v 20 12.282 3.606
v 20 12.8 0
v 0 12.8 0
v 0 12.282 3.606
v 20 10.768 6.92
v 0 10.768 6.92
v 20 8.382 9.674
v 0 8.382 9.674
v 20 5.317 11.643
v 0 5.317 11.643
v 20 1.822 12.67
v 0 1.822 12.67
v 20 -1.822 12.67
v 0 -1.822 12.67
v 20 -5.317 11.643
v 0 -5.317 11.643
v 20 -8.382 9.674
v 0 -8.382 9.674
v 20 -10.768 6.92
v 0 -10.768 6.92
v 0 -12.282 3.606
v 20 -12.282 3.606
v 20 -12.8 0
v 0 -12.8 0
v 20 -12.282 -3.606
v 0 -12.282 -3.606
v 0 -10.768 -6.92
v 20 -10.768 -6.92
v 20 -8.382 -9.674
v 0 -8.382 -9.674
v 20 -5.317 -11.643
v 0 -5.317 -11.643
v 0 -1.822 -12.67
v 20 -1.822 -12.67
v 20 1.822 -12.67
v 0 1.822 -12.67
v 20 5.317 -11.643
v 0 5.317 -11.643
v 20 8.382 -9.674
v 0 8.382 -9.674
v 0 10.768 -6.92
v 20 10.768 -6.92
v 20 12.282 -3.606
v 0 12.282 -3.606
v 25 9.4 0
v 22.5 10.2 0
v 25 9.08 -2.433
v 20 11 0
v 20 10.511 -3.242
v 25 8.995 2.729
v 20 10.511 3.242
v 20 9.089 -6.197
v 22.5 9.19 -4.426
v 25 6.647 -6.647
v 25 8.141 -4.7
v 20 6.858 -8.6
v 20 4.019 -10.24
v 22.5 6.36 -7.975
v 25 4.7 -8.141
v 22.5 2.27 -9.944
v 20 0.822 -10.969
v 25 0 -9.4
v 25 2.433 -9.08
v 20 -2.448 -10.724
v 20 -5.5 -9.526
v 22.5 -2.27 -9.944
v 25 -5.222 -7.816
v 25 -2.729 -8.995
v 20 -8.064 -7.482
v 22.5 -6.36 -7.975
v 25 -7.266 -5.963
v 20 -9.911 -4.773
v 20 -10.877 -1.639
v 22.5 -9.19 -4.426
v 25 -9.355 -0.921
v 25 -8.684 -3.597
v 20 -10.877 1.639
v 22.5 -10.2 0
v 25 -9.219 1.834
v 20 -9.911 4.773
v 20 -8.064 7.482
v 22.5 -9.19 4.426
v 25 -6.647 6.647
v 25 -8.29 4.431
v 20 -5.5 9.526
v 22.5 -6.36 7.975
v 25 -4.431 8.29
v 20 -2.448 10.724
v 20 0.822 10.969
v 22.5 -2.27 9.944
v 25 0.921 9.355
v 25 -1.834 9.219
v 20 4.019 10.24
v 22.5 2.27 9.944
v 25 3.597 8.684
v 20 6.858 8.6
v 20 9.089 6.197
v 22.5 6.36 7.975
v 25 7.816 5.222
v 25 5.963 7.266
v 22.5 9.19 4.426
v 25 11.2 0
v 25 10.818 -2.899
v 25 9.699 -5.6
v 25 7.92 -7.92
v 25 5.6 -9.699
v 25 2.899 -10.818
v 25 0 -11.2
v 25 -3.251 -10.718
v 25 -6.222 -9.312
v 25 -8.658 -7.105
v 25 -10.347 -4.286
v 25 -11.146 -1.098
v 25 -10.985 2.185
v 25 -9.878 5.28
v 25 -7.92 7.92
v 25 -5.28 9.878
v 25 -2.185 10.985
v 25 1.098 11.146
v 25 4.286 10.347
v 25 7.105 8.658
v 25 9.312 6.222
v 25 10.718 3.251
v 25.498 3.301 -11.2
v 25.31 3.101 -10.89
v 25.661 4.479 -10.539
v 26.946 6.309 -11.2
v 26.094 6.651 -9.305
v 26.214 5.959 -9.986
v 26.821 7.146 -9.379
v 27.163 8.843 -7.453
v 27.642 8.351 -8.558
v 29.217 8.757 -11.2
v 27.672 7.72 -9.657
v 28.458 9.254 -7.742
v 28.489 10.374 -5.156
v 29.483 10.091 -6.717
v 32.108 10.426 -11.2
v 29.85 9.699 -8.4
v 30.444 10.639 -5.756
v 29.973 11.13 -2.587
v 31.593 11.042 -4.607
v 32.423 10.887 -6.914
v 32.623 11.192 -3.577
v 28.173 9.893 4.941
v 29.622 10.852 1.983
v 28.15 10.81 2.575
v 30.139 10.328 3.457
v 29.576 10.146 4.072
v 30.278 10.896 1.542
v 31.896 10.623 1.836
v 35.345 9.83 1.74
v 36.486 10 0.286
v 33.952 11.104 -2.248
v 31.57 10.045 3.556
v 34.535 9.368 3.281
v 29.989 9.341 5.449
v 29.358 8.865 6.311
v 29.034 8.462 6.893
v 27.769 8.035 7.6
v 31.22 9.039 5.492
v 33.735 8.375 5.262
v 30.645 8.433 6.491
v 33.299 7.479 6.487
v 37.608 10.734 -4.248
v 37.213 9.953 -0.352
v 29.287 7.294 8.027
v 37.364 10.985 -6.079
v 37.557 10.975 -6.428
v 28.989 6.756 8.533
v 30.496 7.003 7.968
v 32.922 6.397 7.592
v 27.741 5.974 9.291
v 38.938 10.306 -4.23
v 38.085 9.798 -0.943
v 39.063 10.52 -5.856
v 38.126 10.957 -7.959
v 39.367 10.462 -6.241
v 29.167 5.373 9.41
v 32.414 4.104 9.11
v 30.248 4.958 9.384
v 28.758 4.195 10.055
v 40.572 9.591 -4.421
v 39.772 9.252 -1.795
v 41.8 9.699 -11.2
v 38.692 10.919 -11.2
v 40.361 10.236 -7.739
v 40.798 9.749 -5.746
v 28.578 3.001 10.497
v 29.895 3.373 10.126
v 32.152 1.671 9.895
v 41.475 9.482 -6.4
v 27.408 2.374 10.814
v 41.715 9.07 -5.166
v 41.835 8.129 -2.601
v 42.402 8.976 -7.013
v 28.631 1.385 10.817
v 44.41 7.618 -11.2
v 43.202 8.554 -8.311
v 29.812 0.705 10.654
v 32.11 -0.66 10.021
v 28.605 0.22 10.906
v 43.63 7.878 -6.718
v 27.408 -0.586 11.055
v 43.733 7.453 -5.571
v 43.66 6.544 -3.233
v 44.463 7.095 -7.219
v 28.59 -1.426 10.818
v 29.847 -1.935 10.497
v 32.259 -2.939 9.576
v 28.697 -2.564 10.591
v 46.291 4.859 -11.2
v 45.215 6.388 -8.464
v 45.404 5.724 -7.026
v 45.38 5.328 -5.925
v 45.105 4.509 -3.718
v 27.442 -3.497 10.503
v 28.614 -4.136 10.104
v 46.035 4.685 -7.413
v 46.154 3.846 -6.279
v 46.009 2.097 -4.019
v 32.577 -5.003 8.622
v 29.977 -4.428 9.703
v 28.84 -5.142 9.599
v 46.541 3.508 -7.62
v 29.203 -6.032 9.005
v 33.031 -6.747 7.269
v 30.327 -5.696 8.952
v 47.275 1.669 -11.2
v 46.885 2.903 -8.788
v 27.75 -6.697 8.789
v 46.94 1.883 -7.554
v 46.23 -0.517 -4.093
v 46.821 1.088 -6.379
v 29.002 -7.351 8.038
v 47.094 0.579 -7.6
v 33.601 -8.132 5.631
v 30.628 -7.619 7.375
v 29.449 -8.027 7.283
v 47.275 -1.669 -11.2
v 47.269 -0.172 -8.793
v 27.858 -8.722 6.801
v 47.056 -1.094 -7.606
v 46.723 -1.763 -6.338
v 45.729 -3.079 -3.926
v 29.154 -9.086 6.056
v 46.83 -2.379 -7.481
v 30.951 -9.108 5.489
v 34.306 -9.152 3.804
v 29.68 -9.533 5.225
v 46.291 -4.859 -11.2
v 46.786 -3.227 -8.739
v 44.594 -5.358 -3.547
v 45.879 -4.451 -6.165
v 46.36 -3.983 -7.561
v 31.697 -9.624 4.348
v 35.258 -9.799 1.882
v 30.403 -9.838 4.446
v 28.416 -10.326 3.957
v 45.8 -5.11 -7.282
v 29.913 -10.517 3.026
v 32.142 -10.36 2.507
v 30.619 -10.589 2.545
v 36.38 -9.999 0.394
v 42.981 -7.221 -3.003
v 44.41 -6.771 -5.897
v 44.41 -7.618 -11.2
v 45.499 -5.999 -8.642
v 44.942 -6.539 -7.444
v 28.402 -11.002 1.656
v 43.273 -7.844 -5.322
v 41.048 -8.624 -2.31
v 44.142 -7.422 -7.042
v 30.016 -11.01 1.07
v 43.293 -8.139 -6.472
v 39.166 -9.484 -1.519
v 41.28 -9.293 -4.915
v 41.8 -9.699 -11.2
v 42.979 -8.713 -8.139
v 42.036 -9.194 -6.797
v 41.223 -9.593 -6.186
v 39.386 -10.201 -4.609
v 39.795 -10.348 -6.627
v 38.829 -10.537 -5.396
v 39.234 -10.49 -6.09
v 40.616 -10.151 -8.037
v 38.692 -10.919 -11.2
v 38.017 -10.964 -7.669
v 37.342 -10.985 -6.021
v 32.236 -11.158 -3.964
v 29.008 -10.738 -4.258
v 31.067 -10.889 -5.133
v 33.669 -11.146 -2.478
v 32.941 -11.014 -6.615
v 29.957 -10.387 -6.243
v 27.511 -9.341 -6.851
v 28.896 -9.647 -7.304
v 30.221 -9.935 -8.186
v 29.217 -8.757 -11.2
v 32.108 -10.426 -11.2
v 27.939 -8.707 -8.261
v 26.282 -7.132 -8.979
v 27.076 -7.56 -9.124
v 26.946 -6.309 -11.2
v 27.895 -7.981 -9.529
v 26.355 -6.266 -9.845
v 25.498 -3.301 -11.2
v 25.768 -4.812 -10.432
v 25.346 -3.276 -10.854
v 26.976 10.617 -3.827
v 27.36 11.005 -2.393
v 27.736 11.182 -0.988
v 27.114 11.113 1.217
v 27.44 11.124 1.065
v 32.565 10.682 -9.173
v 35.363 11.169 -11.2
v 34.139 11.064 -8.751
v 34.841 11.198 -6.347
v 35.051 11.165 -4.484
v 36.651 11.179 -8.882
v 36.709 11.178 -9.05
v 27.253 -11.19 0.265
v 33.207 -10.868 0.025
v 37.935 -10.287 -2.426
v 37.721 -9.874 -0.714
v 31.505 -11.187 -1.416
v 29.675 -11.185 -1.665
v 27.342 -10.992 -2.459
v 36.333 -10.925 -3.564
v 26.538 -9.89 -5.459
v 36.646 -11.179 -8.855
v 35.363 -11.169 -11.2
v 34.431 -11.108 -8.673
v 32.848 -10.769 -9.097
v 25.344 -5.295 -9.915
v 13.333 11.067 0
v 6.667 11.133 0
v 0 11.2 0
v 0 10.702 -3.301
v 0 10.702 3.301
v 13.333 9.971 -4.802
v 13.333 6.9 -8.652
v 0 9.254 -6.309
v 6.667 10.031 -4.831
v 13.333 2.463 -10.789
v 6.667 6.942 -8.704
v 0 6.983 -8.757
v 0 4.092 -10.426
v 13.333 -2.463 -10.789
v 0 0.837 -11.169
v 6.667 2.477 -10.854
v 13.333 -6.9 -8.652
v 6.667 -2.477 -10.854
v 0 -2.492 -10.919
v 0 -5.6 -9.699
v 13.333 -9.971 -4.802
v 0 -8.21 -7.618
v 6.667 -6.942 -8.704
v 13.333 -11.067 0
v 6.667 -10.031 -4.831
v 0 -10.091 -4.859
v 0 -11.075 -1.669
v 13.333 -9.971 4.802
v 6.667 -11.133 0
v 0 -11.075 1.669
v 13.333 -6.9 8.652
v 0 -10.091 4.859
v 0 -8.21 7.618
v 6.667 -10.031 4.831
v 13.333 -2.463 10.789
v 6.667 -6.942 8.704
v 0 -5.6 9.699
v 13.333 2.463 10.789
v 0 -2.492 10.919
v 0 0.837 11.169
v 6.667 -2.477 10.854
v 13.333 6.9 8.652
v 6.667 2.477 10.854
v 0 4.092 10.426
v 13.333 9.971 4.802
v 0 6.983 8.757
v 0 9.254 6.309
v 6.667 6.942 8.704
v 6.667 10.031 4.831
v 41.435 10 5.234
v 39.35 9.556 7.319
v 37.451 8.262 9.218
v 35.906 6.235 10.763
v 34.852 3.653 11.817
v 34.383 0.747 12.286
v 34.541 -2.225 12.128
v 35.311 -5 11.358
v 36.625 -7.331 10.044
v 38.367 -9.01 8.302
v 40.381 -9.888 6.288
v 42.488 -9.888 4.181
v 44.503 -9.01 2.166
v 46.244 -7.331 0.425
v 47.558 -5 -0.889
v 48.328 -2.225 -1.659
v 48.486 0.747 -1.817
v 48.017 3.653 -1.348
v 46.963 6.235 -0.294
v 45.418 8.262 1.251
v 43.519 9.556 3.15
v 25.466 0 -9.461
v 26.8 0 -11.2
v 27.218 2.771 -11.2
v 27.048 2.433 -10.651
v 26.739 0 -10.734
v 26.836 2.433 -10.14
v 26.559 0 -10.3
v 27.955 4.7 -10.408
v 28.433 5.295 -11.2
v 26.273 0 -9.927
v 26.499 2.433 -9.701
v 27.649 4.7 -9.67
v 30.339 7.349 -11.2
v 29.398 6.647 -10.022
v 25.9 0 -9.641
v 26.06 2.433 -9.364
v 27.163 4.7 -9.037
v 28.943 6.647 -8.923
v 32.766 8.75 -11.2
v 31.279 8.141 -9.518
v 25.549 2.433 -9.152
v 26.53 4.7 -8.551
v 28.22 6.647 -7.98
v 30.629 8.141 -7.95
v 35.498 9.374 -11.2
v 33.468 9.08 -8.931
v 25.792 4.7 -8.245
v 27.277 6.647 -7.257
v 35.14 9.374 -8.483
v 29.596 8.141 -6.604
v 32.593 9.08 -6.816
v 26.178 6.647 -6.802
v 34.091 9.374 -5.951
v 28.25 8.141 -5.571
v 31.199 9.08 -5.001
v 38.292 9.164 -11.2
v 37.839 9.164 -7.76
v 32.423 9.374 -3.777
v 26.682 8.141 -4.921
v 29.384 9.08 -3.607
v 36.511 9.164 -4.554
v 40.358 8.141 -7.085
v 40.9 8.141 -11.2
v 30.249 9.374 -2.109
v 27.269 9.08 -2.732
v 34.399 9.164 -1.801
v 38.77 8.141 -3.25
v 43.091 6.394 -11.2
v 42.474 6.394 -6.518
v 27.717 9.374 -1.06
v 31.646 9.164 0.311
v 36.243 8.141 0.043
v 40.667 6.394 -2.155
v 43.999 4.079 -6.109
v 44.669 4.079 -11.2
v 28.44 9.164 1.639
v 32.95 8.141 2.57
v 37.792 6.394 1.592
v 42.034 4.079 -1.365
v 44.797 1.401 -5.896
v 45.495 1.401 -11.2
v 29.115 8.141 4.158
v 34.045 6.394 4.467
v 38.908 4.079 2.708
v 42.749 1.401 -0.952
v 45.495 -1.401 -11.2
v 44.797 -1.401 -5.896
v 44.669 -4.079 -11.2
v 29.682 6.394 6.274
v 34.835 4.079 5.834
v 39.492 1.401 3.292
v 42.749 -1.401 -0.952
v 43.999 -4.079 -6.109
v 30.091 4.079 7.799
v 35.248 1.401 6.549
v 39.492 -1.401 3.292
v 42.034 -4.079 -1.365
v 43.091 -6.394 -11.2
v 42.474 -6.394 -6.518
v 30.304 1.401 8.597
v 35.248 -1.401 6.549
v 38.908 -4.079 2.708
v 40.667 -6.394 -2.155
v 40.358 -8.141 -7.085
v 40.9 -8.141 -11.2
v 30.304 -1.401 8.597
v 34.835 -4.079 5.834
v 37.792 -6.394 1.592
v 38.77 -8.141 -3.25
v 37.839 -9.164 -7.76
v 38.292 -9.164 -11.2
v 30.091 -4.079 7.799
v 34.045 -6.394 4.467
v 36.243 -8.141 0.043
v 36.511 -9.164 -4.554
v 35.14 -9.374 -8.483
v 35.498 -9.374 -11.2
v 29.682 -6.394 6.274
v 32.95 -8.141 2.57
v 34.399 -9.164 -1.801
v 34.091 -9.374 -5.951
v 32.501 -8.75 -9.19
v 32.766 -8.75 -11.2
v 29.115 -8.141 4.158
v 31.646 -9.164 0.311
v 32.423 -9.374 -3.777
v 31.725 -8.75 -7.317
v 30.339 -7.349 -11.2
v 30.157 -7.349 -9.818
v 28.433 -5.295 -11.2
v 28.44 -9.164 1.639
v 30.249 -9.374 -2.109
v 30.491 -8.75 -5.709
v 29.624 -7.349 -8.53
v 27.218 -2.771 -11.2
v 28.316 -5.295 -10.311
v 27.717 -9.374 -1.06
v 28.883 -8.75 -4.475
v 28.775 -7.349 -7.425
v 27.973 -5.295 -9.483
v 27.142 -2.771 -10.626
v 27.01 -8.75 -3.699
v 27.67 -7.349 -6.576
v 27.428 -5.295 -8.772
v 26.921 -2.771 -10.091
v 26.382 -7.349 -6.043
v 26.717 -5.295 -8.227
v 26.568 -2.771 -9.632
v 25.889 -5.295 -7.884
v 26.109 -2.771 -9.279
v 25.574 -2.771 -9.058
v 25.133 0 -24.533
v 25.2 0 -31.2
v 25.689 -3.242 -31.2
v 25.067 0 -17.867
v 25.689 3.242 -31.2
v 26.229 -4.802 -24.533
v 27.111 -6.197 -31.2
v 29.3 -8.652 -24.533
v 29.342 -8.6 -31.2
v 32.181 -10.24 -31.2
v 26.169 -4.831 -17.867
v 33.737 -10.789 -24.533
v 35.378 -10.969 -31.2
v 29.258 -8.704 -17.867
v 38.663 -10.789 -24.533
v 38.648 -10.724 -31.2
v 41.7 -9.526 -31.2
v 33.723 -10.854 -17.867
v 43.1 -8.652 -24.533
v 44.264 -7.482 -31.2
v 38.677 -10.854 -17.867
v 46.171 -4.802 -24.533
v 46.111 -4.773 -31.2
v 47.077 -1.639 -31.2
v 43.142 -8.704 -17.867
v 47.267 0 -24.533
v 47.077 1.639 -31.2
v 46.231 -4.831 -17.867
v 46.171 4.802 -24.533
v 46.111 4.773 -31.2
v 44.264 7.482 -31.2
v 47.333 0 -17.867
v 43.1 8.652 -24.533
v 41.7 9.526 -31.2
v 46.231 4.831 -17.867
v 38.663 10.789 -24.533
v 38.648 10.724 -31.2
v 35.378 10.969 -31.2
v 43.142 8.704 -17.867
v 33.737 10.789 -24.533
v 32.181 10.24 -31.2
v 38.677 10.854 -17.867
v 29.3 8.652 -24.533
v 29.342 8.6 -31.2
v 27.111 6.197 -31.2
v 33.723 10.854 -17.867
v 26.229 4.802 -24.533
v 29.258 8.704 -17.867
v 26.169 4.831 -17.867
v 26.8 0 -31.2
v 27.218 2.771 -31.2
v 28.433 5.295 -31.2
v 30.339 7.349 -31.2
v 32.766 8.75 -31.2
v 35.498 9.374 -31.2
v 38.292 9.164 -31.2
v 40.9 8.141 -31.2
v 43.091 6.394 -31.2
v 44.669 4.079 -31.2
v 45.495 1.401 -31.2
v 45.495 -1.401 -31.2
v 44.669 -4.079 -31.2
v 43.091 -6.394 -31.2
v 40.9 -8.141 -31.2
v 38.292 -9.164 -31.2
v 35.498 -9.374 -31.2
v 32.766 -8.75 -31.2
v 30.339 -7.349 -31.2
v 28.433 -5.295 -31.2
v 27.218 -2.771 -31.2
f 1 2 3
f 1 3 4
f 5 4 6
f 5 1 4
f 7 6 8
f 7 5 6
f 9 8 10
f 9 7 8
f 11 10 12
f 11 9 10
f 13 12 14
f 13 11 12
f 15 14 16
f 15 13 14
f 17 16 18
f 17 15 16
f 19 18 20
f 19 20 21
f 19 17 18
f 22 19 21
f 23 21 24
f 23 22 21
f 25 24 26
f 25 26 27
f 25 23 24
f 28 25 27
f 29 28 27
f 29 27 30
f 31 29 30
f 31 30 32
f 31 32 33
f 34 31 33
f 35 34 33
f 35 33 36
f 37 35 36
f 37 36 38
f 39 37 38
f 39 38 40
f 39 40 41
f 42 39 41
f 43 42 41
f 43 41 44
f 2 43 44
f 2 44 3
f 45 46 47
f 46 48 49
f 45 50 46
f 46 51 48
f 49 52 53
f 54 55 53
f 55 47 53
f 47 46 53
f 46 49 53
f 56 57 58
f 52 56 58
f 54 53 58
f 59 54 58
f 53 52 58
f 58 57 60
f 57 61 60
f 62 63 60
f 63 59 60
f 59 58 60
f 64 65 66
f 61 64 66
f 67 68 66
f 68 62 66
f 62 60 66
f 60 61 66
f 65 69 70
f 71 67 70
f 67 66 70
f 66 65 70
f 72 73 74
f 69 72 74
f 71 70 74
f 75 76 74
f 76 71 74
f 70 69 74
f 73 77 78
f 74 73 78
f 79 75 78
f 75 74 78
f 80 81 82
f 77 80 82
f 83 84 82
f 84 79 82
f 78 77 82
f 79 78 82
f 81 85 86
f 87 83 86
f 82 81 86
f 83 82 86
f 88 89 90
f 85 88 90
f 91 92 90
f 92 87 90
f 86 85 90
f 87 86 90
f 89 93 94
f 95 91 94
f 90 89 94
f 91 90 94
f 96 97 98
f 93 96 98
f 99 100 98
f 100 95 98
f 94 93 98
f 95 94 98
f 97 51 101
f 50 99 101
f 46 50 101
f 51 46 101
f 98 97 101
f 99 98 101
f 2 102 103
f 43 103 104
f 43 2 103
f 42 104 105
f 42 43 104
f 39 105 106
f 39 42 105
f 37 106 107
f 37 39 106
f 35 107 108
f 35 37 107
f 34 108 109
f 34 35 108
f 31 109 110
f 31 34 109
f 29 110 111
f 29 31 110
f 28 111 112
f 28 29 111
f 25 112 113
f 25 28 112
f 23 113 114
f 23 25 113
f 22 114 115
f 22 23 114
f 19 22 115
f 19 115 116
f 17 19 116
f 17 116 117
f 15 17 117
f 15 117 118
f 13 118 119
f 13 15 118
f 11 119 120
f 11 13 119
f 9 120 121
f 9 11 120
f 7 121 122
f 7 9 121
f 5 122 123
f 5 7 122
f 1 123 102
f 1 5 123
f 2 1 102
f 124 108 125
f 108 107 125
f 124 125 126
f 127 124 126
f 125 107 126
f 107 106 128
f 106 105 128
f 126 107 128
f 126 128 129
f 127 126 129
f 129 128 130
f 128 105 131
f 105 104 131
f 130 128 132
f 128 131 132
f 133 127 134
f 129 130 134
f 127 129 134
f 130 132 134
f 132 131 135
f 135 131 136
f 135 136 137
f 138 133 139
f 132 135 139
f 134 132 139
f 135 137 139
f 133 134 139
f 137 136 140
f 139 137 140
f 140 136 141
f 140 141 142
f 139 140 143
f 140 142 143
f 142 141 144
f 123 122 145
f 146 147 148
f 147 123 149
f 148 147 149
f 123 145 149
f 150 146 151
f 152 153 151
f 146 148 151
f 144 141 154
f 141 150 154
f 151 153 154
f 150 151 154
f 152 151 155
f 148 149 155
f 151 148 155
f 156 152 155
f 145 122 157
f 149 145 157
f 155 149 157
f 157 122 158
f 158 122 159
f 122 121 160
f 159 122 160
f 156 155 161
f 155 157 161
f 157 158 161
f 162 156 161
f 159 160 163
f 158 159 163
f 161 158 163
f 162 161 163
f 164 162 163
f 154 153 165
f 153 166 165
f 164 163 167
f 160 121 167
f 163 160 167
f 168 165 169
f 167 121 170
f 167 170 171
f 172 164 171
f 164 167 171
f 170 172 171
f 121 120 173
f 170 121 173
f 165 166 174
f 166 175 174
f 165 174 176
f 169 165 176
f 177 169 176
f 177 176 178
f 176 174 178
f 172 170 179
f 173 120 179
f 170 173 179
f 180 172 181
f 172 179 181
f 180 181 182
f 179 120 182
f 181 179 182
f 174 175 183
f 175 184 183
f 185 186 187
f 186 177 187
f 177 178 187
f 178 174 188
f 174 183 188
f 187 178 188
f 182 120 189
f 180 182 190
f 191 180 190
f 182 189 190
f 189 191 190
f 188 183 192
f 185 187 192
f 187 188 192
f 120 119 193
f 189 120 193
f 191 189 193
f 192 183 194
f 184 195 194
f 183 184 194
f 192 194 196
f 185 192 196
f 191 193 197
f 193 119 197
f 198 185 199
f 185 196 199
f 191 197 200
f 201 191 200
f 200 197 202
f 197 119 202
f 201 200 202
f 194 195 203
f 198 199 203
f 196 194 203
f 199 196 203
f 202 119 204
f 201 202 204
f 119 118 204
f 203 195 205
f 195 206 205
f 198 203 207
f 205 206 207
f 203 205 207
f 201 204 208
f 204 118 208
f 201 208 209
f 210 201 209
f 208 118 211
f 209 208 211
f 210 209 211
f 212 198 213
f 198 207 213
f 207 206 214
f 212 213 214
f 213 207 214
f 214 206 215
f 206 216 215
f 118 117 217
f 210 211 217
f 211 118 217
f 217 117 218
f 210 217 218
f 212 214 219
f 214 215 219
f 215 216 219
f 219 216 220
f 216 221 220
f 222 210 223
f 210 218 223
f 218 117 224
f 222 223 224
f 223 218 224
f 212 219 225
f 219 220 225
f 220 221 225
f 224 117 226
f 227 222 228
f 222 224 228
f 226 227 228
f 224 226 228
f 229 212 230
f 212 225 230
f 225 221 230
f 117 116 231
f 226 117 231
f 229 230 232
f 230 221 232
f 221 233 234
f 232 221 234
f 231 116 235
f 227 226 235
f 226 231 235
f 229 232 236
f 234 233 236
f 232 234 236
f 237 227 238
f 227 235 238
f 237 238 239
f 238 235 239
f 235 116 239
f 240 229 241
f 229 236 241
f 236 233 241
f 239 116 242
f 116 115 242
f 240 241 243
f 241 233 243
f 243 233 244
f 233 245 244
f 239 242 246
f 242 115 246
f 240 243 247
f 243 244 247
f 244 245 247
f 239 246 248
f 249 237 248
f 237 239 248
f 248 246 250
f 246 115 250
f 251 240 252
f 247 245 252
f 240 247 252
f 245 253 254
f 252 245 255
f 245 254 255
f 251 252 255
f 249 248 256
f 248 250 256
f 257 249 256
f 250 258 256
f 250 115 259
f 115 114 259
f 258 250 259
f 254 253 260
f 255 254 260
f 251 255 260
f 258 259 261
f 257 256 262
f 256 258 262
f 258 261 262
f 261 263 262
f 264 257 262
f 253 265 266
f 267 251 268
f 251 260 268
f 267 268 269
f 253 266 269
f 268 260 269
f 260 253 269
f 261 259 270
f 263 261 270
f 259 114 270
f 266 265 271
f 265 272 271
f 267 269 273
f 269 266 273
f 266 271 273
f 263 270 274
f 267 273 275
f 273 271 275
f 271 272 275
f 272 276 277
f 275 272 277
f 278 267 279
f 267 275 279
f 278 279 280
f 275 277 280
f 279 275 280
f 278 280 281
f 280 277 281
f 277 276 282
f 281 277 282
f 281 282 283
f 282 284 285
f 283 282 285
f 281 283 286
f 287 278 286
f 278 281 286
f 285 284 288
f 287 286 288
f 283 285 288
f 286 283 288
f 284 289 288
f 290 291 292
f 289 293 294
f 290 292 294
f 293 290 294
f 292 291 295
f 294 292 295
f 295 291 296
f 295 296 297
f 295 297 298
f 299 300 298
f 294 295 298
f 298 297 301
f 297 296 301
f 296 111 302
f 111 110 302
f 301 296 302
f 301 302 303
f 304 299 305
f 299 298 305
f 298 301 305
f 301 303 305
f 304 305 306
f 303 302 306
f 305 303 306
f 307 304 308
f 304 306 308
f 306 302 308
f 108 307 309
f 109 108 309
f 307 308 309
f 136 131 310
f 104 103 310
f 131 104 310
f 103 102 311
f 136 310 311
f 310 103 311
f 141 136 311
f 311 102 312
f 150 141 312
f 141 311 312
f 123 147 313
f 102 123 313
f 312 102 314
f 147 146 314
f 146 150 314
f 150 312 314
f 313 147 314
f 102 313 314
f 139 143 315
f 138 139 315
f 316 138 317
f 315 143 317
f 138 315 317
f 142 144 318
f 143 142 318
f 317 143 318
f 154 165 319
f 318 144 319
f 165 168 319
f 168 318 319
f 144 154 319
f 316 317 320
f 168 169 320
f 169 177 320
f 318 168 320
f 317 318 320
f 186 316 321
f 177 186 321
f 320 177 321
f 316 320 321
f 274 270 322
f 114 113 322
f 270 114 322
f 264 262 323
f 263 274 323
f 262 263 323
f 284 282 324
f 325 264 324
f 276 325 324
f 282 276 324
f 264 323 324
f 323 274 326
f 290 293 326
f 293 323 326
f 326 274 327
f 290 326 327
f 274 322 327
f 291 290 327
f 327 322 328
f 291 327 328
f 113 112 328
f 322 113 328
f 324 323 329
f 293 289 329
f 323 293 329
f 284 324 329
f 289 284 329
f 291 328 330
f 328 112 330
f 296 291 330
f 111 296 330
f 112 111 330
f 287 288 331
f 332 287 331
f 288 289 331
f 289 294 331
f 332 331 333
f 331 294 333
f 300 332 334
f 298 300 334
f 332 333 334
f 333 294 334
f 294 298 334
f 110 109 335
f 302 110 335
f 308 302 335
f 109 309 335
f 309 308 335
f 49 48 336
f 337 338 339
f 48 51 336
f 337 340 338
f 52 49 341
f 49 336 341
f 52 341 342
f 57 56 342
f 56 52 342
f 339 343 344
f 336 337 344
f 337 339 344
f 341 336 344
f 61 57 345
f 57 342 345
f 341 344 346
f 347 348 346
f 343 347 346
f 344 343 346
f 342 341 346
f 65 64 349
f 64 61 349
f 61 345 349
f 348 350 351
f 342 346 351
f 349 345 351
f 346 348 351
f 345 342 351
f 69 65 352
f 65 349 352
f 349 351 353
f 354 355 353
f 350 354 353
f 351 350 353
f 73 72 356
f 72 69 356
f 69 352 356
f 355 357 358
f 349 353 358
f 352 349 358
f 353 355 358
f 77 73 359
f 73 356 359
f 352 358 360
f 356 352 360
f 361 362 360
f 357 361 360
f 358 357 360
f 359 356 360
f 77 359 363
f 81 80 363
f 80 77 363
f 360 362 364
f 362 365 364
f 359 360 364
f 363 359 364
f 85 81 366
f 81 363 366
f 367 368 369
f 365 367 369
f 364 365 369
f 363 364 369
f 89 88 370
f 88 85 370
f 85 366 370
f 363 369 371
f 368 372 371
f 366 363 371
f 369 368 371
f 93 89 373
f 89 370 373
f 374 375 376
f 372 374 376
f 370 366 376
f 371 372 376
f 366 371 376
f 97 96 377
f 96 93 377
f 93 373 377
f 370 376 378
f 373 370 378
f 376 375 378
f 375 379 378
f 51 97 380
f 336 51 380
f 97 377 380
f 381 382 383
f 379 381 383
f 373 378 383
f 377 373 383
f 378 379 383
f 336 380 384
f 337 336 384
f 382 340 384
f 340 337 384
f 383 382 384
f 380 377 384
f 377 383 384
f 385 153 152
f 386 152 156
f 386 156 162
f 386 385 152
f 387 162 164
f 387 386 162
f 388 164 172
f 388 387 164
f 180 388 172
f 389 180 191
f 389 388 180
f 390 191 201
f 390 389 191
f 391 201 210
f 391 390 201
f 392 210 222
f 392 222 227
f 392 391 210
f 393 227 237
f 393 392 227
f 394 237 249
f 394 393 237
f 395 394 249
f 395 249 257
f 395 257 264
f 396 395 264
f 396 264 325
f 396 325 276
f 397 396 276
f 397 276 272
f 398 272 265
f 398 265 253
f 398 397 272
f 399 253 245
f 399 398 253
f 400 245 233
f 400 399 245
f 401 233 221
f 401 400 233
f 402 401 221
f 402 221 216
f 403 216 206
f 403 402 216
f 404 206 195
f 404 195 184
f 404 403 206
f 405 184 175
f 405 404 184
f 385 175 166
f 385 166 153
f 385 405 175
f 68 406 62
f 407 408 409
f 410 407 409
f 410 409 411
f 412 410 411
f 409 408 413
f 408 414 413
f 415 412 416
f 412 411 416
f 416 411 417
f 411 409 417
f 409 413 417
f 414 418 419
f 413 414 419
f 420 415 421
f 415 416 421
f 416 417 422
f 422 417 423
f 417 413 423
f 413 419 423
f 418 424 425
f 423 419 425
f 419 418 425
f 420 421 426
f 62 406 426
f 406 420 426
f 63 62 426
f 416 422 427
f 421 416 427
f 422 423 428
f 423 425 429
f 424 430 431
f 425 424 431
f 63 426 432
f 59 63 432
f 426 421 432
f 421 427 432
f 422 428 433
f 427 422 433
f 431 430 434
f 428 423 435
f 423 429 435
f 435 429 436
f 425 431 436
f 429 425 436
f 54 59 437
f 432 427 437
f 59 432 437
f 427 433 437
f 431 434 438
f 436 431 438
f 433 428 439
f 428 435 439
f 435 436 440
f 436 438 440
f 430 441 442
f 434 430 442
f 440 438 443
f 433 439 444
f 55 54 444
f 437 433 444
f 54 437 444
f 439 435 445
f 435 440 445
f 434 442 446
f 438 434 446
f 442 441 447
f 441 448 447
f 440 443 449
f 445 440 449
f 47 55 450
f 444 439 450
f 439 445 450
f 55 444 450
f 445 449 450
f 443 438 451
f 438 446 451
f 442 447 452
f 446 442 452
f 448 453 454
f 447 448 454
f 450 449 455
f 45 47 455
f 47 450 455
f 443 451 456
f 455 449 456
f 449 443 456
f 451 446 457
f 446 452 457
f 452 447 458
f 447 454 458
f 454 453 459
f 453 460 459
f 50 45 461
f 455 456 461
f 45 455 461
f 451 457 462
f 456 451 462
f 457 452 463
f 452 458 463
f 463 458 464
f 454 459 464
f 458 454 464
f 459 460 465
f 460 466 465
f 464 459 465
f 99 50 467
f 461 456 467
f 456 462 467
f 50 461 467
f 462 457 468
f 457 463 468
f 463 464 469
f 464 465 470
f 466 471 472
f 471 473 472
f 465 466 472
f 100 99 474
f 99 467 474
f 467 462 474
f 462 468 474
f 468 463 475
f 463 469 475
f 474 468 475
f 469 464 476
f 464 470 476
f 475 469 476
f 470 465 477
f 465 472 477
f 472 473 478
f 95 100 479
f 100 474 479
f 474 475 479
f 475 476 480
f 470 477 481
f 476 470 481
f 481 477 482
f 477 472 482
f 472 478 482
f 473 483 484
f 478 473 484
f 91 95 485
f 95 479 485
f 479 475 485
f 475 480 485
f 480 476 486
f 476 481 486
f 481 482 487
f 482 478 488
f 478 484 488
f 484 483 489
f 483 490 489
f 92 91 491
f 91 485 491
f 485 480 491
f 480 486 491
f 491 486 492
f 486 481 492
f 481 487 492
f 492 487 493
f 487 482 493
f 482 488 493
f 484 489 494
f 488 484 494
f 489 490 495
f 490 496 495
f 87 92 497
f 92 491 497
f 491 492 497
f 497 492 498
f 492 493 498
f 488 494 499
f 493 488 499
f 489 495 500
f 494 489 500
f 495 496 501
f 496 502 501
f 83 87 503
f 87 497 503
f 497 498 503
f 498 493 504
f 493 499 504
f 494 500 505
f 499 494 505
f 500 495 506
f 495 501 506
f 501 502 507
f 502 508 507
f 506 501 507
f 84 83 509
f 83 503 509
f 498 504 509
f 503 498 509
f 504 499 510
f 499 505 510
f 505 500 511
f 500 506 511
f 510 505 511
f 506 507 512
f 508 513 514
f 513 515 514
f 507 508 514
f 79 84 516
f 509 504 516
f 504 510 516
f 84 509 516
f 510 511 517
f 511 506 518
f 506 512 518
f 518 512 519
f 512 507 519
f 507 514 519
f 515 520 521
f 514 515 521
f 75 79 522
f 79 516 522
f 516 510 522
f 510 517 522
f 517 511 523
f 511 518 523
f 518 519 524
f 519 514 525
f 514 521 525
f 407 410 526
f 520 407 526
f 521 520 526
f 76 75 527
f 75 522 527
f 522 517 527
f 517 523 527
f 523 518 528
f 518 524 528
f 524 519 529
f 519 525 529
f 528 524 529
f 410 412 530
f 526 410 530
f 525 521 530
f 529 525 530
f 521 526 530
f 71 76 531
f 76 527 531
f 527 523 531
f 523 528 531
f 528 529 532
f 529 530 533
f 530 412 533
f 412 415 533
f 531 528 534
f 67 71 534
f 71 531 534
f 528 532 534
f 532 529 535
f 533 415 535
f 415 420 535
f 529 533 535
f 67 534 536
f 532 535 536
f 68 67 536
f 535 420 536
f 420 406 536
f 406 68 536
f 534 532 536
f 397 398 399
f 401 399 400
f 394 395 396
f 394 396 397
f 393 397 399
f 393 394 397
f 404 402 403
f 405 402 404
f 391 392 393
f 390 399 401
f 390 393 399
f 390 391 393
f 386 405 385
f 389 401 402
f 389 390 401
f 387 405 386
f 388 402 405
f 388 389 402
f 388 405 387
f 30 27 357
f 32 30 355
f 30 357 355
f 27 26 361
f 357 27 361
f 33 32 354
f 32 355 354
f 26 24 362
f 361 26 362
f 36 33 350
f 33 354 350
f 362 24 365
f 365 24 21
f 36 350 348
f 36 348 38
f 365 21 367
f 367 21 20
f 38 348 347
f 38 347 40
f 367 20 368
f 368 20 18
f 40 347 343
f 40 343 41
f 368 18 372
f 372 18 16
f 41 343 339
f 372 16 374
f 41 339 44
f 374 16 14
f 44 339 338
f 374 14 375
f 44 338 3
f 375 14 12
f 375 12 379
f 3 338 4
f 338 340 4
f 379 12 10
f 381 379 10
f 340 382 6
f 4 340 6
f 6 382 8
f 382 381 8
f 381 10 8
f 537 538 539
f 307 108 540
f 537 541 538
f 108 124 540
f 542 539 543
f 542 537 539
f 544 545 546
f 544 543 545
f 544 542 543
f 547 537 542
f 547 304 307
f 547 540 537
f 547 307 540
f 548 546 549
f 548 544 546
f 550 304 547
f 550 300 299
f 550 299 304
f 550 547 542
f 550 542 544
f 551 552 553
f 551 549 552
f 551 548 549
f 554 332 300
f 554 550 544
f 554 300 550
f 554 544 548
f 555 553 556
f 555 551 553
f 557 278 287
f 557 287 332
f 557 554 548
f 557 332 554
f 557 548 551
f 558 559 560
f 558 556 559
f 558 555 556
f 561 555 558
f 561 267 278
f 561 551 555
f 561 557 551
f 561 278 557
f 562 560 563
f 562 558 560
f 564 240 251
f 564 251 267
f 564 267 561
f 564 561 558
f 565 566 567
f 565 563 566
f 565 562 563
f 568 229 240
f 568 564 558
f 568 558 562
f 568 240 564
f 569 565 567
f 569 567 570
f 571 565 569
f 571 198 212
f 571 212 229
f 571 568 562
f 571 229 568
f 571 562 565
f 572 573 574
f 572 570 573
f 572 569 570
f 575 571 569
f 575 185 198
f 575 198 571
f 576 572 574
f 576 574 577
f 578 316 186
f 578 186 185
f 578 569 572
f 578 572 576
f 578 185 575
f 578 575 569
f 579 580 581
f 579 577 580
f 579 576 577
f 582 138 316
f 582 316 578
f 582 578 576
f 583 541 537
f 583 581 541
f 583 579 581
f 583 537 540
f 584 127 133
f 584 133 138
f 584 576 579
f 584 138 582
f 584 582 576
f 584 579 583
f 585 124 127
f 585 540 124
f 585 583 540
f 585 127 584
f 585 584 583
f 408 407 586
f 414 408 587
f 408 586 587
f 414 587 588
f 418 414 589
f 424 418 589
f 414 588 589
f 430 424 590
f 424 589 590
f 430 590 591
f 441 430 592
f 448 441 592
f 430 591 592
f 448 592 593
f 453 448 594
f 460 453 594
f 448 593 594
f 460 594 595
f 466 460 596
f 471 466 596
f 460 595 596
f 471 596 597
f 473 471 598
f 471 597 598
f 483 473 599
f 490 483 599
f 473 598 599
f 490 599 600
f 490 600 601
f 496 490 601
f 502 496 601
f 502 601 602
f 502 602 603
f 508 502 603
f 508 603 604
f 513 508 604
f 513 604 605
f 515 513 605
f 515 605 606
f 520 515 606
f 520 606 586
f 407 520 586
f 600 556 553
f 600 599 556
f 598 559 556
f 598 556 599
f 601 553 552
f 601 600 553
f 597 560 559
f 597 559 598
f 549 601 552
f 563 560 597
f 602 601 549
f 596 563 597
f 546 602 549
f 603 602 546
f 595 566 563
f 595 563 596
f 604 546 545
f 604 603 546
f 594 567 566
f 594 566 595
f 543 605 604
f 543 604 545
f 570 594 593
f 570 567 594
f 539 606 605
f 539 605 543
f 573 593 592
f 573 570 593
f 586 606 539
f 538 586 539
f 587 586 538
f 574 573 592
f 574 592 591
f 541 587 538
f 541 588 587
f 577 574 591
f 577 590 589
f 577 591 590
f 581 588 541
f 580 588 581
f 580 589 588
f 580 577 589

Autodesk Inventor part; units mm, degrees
ref_plane "XZ Plane" through (0, 0, 0) normal (0, 1, 0) x (-1, 0, 0)
ref_plane "XY Plane" through (0, 0, 0) normal (0, 0, 1) x (1, 0, 0)
sketch "Sketch1" plane through (0, 0, 0) normal (0, 0, 1) x (1, 0, 0)
  line L0 (0, 0) -> (0, 11.2) construction
  line L1 (0, 0) -> (20, 0) construction
  line L2 (20, 0) -> (20, 11) construction
  line L3 (0, 11.2) -> (0, 12.8)
  line L4 (0, 11.2) -> (20, 11)
  line L5 (0, 12.8) -> (20, 12.8)
  line L6 (0, 12.8) -> (20, 12.8) construction
  line L7 (20, 12.8) -> (20, 11)
  line L8 (20, 0) -> (25, 0) construction
  line L9 (25, 0) -> (25, 11.2) construction
  line L10 (25, 11.2) -> (20, 12.8)
  line L11 (25, 11.2) -> (25, 9.4)
  line L12 (25, 9.4) -> (20, 11)
  dimension "d0" = 11.2
  dimension "d1" = 20
  dimension "d2" = 11
  dimension "d3" = 1.6
  dimension "d4" = 0
  dimension "d5" = 5
  dimension "d6" = 11.2
  dimension "d7" = 1.8
revolve "Revolution1" add sketch "Sketch1" angle 360 about axis through (0, 0, 0) along (1, 0, 0)
sketch "Sketch2" plane through (25, 0, 0) normal (1, 0, 0) x (0, 0, -1)
  line L0 (0, 0) -> (11.2, 0) construction
  circle A0 centre (0, 0) radius 9.4 projected
  circle A1 centre (0, 0) radius 11.2 projected
  line L1 (11.2, 0) -> (11.2, 12.8) construction
  dimension "d9" = 11.2
revolve "Revolution2" add sketch "Sketch2" angle 90 about axis through (25, 0, -11.2) along (0, 1, 0)
sketch "Sketch3" plane through (0, 0, 0) normal (0, 1, 0) x (-1, 0, 0)
  line L0 (-47.4, -11.2) -> (-25, -11.2) construction
  line L1 (-36.2, -11.2) -> (-36.2, -31.2) construction
  line L2 (-36.2, -31.2) -> (-25.2, -31.2) construction
  line L3 (-25.2, -31.2) -> (-25, -11.2)
  line L4 (-25, -11.2) -> (-26.8, -11.2)
  arc A0 (-25, -9.4) -> (-26.8, -11.2) centre (-25, -11.2) ccw projected
  line L5 (-26.8, -11.2) -> (-26.8, -31.2)
  line L6 (-25.2, -31.2) -> (-26.8, -31.2)
  point P0 (0, 0)
  dimension "d11" = 20
  dimension "d12" = 11
revolve "Revolution3" add sketch "Sketch3" angle 360 about axis through (36.2, 0, -11.2) along (0, 0, -1)
ref_plane "Work Plane2" through (23.3345, 0, 23.3345) normal (0.7071, 0, 0.7071) x (0, 1, 0)
ref_plane "Work Plane1" through (0, 0, 0) normal (0.7071, 0, 0.7071) x (0, 1, 0)
sketch "Sketch4" plane through (23.3345, 0, 23.3345) normal (0.7071, 0, 0.7071) x (0, 1, 0)
  ellipse E0 centre (0, -17.6777) end of major axis (11.2, -17.6777) minor radius 7.9196 construction
  ellipse E1 centre (0, -33.5169) end of major axis (11.2, -33.5169) minor radius 7.9196 construction
  line L0 (0, -17.6777) -> (0, -33.5169) construction
  circle A0 centre (0, -25.5973) radius 10
  point P0 (0, 0)
  dimension "d16" = 20
extrude "Extrusion1" add sketch "Sketch4" against normal up to surface
equation "\"d0\" = 0.5 * TMEnd"
equation "\"d1\" = TDepth"
equation "\"d2\" = 0.5 * TMStart"
equation "\"d3\" = WallT"
equation "\"d6\" = 0.5 * TMEnd"
equation "\"d7\" = WallT + 0.5 * TMEnd - 0.5 * TMStart"
equation "\"d9\" = BendR"
equation "\"d11\" = TDepth"
equation "\"d12\" = 0.5 * TMStart"
equation "\"TMEnd\" = 22.4"
equation "\"TDepth\" = 20"
equation "\"TMStart\" = 22"
equation "\"WallT\" = 1.6"
equation "\"BendR\" = 11.2"
properties part number "MtoF90Degree"
